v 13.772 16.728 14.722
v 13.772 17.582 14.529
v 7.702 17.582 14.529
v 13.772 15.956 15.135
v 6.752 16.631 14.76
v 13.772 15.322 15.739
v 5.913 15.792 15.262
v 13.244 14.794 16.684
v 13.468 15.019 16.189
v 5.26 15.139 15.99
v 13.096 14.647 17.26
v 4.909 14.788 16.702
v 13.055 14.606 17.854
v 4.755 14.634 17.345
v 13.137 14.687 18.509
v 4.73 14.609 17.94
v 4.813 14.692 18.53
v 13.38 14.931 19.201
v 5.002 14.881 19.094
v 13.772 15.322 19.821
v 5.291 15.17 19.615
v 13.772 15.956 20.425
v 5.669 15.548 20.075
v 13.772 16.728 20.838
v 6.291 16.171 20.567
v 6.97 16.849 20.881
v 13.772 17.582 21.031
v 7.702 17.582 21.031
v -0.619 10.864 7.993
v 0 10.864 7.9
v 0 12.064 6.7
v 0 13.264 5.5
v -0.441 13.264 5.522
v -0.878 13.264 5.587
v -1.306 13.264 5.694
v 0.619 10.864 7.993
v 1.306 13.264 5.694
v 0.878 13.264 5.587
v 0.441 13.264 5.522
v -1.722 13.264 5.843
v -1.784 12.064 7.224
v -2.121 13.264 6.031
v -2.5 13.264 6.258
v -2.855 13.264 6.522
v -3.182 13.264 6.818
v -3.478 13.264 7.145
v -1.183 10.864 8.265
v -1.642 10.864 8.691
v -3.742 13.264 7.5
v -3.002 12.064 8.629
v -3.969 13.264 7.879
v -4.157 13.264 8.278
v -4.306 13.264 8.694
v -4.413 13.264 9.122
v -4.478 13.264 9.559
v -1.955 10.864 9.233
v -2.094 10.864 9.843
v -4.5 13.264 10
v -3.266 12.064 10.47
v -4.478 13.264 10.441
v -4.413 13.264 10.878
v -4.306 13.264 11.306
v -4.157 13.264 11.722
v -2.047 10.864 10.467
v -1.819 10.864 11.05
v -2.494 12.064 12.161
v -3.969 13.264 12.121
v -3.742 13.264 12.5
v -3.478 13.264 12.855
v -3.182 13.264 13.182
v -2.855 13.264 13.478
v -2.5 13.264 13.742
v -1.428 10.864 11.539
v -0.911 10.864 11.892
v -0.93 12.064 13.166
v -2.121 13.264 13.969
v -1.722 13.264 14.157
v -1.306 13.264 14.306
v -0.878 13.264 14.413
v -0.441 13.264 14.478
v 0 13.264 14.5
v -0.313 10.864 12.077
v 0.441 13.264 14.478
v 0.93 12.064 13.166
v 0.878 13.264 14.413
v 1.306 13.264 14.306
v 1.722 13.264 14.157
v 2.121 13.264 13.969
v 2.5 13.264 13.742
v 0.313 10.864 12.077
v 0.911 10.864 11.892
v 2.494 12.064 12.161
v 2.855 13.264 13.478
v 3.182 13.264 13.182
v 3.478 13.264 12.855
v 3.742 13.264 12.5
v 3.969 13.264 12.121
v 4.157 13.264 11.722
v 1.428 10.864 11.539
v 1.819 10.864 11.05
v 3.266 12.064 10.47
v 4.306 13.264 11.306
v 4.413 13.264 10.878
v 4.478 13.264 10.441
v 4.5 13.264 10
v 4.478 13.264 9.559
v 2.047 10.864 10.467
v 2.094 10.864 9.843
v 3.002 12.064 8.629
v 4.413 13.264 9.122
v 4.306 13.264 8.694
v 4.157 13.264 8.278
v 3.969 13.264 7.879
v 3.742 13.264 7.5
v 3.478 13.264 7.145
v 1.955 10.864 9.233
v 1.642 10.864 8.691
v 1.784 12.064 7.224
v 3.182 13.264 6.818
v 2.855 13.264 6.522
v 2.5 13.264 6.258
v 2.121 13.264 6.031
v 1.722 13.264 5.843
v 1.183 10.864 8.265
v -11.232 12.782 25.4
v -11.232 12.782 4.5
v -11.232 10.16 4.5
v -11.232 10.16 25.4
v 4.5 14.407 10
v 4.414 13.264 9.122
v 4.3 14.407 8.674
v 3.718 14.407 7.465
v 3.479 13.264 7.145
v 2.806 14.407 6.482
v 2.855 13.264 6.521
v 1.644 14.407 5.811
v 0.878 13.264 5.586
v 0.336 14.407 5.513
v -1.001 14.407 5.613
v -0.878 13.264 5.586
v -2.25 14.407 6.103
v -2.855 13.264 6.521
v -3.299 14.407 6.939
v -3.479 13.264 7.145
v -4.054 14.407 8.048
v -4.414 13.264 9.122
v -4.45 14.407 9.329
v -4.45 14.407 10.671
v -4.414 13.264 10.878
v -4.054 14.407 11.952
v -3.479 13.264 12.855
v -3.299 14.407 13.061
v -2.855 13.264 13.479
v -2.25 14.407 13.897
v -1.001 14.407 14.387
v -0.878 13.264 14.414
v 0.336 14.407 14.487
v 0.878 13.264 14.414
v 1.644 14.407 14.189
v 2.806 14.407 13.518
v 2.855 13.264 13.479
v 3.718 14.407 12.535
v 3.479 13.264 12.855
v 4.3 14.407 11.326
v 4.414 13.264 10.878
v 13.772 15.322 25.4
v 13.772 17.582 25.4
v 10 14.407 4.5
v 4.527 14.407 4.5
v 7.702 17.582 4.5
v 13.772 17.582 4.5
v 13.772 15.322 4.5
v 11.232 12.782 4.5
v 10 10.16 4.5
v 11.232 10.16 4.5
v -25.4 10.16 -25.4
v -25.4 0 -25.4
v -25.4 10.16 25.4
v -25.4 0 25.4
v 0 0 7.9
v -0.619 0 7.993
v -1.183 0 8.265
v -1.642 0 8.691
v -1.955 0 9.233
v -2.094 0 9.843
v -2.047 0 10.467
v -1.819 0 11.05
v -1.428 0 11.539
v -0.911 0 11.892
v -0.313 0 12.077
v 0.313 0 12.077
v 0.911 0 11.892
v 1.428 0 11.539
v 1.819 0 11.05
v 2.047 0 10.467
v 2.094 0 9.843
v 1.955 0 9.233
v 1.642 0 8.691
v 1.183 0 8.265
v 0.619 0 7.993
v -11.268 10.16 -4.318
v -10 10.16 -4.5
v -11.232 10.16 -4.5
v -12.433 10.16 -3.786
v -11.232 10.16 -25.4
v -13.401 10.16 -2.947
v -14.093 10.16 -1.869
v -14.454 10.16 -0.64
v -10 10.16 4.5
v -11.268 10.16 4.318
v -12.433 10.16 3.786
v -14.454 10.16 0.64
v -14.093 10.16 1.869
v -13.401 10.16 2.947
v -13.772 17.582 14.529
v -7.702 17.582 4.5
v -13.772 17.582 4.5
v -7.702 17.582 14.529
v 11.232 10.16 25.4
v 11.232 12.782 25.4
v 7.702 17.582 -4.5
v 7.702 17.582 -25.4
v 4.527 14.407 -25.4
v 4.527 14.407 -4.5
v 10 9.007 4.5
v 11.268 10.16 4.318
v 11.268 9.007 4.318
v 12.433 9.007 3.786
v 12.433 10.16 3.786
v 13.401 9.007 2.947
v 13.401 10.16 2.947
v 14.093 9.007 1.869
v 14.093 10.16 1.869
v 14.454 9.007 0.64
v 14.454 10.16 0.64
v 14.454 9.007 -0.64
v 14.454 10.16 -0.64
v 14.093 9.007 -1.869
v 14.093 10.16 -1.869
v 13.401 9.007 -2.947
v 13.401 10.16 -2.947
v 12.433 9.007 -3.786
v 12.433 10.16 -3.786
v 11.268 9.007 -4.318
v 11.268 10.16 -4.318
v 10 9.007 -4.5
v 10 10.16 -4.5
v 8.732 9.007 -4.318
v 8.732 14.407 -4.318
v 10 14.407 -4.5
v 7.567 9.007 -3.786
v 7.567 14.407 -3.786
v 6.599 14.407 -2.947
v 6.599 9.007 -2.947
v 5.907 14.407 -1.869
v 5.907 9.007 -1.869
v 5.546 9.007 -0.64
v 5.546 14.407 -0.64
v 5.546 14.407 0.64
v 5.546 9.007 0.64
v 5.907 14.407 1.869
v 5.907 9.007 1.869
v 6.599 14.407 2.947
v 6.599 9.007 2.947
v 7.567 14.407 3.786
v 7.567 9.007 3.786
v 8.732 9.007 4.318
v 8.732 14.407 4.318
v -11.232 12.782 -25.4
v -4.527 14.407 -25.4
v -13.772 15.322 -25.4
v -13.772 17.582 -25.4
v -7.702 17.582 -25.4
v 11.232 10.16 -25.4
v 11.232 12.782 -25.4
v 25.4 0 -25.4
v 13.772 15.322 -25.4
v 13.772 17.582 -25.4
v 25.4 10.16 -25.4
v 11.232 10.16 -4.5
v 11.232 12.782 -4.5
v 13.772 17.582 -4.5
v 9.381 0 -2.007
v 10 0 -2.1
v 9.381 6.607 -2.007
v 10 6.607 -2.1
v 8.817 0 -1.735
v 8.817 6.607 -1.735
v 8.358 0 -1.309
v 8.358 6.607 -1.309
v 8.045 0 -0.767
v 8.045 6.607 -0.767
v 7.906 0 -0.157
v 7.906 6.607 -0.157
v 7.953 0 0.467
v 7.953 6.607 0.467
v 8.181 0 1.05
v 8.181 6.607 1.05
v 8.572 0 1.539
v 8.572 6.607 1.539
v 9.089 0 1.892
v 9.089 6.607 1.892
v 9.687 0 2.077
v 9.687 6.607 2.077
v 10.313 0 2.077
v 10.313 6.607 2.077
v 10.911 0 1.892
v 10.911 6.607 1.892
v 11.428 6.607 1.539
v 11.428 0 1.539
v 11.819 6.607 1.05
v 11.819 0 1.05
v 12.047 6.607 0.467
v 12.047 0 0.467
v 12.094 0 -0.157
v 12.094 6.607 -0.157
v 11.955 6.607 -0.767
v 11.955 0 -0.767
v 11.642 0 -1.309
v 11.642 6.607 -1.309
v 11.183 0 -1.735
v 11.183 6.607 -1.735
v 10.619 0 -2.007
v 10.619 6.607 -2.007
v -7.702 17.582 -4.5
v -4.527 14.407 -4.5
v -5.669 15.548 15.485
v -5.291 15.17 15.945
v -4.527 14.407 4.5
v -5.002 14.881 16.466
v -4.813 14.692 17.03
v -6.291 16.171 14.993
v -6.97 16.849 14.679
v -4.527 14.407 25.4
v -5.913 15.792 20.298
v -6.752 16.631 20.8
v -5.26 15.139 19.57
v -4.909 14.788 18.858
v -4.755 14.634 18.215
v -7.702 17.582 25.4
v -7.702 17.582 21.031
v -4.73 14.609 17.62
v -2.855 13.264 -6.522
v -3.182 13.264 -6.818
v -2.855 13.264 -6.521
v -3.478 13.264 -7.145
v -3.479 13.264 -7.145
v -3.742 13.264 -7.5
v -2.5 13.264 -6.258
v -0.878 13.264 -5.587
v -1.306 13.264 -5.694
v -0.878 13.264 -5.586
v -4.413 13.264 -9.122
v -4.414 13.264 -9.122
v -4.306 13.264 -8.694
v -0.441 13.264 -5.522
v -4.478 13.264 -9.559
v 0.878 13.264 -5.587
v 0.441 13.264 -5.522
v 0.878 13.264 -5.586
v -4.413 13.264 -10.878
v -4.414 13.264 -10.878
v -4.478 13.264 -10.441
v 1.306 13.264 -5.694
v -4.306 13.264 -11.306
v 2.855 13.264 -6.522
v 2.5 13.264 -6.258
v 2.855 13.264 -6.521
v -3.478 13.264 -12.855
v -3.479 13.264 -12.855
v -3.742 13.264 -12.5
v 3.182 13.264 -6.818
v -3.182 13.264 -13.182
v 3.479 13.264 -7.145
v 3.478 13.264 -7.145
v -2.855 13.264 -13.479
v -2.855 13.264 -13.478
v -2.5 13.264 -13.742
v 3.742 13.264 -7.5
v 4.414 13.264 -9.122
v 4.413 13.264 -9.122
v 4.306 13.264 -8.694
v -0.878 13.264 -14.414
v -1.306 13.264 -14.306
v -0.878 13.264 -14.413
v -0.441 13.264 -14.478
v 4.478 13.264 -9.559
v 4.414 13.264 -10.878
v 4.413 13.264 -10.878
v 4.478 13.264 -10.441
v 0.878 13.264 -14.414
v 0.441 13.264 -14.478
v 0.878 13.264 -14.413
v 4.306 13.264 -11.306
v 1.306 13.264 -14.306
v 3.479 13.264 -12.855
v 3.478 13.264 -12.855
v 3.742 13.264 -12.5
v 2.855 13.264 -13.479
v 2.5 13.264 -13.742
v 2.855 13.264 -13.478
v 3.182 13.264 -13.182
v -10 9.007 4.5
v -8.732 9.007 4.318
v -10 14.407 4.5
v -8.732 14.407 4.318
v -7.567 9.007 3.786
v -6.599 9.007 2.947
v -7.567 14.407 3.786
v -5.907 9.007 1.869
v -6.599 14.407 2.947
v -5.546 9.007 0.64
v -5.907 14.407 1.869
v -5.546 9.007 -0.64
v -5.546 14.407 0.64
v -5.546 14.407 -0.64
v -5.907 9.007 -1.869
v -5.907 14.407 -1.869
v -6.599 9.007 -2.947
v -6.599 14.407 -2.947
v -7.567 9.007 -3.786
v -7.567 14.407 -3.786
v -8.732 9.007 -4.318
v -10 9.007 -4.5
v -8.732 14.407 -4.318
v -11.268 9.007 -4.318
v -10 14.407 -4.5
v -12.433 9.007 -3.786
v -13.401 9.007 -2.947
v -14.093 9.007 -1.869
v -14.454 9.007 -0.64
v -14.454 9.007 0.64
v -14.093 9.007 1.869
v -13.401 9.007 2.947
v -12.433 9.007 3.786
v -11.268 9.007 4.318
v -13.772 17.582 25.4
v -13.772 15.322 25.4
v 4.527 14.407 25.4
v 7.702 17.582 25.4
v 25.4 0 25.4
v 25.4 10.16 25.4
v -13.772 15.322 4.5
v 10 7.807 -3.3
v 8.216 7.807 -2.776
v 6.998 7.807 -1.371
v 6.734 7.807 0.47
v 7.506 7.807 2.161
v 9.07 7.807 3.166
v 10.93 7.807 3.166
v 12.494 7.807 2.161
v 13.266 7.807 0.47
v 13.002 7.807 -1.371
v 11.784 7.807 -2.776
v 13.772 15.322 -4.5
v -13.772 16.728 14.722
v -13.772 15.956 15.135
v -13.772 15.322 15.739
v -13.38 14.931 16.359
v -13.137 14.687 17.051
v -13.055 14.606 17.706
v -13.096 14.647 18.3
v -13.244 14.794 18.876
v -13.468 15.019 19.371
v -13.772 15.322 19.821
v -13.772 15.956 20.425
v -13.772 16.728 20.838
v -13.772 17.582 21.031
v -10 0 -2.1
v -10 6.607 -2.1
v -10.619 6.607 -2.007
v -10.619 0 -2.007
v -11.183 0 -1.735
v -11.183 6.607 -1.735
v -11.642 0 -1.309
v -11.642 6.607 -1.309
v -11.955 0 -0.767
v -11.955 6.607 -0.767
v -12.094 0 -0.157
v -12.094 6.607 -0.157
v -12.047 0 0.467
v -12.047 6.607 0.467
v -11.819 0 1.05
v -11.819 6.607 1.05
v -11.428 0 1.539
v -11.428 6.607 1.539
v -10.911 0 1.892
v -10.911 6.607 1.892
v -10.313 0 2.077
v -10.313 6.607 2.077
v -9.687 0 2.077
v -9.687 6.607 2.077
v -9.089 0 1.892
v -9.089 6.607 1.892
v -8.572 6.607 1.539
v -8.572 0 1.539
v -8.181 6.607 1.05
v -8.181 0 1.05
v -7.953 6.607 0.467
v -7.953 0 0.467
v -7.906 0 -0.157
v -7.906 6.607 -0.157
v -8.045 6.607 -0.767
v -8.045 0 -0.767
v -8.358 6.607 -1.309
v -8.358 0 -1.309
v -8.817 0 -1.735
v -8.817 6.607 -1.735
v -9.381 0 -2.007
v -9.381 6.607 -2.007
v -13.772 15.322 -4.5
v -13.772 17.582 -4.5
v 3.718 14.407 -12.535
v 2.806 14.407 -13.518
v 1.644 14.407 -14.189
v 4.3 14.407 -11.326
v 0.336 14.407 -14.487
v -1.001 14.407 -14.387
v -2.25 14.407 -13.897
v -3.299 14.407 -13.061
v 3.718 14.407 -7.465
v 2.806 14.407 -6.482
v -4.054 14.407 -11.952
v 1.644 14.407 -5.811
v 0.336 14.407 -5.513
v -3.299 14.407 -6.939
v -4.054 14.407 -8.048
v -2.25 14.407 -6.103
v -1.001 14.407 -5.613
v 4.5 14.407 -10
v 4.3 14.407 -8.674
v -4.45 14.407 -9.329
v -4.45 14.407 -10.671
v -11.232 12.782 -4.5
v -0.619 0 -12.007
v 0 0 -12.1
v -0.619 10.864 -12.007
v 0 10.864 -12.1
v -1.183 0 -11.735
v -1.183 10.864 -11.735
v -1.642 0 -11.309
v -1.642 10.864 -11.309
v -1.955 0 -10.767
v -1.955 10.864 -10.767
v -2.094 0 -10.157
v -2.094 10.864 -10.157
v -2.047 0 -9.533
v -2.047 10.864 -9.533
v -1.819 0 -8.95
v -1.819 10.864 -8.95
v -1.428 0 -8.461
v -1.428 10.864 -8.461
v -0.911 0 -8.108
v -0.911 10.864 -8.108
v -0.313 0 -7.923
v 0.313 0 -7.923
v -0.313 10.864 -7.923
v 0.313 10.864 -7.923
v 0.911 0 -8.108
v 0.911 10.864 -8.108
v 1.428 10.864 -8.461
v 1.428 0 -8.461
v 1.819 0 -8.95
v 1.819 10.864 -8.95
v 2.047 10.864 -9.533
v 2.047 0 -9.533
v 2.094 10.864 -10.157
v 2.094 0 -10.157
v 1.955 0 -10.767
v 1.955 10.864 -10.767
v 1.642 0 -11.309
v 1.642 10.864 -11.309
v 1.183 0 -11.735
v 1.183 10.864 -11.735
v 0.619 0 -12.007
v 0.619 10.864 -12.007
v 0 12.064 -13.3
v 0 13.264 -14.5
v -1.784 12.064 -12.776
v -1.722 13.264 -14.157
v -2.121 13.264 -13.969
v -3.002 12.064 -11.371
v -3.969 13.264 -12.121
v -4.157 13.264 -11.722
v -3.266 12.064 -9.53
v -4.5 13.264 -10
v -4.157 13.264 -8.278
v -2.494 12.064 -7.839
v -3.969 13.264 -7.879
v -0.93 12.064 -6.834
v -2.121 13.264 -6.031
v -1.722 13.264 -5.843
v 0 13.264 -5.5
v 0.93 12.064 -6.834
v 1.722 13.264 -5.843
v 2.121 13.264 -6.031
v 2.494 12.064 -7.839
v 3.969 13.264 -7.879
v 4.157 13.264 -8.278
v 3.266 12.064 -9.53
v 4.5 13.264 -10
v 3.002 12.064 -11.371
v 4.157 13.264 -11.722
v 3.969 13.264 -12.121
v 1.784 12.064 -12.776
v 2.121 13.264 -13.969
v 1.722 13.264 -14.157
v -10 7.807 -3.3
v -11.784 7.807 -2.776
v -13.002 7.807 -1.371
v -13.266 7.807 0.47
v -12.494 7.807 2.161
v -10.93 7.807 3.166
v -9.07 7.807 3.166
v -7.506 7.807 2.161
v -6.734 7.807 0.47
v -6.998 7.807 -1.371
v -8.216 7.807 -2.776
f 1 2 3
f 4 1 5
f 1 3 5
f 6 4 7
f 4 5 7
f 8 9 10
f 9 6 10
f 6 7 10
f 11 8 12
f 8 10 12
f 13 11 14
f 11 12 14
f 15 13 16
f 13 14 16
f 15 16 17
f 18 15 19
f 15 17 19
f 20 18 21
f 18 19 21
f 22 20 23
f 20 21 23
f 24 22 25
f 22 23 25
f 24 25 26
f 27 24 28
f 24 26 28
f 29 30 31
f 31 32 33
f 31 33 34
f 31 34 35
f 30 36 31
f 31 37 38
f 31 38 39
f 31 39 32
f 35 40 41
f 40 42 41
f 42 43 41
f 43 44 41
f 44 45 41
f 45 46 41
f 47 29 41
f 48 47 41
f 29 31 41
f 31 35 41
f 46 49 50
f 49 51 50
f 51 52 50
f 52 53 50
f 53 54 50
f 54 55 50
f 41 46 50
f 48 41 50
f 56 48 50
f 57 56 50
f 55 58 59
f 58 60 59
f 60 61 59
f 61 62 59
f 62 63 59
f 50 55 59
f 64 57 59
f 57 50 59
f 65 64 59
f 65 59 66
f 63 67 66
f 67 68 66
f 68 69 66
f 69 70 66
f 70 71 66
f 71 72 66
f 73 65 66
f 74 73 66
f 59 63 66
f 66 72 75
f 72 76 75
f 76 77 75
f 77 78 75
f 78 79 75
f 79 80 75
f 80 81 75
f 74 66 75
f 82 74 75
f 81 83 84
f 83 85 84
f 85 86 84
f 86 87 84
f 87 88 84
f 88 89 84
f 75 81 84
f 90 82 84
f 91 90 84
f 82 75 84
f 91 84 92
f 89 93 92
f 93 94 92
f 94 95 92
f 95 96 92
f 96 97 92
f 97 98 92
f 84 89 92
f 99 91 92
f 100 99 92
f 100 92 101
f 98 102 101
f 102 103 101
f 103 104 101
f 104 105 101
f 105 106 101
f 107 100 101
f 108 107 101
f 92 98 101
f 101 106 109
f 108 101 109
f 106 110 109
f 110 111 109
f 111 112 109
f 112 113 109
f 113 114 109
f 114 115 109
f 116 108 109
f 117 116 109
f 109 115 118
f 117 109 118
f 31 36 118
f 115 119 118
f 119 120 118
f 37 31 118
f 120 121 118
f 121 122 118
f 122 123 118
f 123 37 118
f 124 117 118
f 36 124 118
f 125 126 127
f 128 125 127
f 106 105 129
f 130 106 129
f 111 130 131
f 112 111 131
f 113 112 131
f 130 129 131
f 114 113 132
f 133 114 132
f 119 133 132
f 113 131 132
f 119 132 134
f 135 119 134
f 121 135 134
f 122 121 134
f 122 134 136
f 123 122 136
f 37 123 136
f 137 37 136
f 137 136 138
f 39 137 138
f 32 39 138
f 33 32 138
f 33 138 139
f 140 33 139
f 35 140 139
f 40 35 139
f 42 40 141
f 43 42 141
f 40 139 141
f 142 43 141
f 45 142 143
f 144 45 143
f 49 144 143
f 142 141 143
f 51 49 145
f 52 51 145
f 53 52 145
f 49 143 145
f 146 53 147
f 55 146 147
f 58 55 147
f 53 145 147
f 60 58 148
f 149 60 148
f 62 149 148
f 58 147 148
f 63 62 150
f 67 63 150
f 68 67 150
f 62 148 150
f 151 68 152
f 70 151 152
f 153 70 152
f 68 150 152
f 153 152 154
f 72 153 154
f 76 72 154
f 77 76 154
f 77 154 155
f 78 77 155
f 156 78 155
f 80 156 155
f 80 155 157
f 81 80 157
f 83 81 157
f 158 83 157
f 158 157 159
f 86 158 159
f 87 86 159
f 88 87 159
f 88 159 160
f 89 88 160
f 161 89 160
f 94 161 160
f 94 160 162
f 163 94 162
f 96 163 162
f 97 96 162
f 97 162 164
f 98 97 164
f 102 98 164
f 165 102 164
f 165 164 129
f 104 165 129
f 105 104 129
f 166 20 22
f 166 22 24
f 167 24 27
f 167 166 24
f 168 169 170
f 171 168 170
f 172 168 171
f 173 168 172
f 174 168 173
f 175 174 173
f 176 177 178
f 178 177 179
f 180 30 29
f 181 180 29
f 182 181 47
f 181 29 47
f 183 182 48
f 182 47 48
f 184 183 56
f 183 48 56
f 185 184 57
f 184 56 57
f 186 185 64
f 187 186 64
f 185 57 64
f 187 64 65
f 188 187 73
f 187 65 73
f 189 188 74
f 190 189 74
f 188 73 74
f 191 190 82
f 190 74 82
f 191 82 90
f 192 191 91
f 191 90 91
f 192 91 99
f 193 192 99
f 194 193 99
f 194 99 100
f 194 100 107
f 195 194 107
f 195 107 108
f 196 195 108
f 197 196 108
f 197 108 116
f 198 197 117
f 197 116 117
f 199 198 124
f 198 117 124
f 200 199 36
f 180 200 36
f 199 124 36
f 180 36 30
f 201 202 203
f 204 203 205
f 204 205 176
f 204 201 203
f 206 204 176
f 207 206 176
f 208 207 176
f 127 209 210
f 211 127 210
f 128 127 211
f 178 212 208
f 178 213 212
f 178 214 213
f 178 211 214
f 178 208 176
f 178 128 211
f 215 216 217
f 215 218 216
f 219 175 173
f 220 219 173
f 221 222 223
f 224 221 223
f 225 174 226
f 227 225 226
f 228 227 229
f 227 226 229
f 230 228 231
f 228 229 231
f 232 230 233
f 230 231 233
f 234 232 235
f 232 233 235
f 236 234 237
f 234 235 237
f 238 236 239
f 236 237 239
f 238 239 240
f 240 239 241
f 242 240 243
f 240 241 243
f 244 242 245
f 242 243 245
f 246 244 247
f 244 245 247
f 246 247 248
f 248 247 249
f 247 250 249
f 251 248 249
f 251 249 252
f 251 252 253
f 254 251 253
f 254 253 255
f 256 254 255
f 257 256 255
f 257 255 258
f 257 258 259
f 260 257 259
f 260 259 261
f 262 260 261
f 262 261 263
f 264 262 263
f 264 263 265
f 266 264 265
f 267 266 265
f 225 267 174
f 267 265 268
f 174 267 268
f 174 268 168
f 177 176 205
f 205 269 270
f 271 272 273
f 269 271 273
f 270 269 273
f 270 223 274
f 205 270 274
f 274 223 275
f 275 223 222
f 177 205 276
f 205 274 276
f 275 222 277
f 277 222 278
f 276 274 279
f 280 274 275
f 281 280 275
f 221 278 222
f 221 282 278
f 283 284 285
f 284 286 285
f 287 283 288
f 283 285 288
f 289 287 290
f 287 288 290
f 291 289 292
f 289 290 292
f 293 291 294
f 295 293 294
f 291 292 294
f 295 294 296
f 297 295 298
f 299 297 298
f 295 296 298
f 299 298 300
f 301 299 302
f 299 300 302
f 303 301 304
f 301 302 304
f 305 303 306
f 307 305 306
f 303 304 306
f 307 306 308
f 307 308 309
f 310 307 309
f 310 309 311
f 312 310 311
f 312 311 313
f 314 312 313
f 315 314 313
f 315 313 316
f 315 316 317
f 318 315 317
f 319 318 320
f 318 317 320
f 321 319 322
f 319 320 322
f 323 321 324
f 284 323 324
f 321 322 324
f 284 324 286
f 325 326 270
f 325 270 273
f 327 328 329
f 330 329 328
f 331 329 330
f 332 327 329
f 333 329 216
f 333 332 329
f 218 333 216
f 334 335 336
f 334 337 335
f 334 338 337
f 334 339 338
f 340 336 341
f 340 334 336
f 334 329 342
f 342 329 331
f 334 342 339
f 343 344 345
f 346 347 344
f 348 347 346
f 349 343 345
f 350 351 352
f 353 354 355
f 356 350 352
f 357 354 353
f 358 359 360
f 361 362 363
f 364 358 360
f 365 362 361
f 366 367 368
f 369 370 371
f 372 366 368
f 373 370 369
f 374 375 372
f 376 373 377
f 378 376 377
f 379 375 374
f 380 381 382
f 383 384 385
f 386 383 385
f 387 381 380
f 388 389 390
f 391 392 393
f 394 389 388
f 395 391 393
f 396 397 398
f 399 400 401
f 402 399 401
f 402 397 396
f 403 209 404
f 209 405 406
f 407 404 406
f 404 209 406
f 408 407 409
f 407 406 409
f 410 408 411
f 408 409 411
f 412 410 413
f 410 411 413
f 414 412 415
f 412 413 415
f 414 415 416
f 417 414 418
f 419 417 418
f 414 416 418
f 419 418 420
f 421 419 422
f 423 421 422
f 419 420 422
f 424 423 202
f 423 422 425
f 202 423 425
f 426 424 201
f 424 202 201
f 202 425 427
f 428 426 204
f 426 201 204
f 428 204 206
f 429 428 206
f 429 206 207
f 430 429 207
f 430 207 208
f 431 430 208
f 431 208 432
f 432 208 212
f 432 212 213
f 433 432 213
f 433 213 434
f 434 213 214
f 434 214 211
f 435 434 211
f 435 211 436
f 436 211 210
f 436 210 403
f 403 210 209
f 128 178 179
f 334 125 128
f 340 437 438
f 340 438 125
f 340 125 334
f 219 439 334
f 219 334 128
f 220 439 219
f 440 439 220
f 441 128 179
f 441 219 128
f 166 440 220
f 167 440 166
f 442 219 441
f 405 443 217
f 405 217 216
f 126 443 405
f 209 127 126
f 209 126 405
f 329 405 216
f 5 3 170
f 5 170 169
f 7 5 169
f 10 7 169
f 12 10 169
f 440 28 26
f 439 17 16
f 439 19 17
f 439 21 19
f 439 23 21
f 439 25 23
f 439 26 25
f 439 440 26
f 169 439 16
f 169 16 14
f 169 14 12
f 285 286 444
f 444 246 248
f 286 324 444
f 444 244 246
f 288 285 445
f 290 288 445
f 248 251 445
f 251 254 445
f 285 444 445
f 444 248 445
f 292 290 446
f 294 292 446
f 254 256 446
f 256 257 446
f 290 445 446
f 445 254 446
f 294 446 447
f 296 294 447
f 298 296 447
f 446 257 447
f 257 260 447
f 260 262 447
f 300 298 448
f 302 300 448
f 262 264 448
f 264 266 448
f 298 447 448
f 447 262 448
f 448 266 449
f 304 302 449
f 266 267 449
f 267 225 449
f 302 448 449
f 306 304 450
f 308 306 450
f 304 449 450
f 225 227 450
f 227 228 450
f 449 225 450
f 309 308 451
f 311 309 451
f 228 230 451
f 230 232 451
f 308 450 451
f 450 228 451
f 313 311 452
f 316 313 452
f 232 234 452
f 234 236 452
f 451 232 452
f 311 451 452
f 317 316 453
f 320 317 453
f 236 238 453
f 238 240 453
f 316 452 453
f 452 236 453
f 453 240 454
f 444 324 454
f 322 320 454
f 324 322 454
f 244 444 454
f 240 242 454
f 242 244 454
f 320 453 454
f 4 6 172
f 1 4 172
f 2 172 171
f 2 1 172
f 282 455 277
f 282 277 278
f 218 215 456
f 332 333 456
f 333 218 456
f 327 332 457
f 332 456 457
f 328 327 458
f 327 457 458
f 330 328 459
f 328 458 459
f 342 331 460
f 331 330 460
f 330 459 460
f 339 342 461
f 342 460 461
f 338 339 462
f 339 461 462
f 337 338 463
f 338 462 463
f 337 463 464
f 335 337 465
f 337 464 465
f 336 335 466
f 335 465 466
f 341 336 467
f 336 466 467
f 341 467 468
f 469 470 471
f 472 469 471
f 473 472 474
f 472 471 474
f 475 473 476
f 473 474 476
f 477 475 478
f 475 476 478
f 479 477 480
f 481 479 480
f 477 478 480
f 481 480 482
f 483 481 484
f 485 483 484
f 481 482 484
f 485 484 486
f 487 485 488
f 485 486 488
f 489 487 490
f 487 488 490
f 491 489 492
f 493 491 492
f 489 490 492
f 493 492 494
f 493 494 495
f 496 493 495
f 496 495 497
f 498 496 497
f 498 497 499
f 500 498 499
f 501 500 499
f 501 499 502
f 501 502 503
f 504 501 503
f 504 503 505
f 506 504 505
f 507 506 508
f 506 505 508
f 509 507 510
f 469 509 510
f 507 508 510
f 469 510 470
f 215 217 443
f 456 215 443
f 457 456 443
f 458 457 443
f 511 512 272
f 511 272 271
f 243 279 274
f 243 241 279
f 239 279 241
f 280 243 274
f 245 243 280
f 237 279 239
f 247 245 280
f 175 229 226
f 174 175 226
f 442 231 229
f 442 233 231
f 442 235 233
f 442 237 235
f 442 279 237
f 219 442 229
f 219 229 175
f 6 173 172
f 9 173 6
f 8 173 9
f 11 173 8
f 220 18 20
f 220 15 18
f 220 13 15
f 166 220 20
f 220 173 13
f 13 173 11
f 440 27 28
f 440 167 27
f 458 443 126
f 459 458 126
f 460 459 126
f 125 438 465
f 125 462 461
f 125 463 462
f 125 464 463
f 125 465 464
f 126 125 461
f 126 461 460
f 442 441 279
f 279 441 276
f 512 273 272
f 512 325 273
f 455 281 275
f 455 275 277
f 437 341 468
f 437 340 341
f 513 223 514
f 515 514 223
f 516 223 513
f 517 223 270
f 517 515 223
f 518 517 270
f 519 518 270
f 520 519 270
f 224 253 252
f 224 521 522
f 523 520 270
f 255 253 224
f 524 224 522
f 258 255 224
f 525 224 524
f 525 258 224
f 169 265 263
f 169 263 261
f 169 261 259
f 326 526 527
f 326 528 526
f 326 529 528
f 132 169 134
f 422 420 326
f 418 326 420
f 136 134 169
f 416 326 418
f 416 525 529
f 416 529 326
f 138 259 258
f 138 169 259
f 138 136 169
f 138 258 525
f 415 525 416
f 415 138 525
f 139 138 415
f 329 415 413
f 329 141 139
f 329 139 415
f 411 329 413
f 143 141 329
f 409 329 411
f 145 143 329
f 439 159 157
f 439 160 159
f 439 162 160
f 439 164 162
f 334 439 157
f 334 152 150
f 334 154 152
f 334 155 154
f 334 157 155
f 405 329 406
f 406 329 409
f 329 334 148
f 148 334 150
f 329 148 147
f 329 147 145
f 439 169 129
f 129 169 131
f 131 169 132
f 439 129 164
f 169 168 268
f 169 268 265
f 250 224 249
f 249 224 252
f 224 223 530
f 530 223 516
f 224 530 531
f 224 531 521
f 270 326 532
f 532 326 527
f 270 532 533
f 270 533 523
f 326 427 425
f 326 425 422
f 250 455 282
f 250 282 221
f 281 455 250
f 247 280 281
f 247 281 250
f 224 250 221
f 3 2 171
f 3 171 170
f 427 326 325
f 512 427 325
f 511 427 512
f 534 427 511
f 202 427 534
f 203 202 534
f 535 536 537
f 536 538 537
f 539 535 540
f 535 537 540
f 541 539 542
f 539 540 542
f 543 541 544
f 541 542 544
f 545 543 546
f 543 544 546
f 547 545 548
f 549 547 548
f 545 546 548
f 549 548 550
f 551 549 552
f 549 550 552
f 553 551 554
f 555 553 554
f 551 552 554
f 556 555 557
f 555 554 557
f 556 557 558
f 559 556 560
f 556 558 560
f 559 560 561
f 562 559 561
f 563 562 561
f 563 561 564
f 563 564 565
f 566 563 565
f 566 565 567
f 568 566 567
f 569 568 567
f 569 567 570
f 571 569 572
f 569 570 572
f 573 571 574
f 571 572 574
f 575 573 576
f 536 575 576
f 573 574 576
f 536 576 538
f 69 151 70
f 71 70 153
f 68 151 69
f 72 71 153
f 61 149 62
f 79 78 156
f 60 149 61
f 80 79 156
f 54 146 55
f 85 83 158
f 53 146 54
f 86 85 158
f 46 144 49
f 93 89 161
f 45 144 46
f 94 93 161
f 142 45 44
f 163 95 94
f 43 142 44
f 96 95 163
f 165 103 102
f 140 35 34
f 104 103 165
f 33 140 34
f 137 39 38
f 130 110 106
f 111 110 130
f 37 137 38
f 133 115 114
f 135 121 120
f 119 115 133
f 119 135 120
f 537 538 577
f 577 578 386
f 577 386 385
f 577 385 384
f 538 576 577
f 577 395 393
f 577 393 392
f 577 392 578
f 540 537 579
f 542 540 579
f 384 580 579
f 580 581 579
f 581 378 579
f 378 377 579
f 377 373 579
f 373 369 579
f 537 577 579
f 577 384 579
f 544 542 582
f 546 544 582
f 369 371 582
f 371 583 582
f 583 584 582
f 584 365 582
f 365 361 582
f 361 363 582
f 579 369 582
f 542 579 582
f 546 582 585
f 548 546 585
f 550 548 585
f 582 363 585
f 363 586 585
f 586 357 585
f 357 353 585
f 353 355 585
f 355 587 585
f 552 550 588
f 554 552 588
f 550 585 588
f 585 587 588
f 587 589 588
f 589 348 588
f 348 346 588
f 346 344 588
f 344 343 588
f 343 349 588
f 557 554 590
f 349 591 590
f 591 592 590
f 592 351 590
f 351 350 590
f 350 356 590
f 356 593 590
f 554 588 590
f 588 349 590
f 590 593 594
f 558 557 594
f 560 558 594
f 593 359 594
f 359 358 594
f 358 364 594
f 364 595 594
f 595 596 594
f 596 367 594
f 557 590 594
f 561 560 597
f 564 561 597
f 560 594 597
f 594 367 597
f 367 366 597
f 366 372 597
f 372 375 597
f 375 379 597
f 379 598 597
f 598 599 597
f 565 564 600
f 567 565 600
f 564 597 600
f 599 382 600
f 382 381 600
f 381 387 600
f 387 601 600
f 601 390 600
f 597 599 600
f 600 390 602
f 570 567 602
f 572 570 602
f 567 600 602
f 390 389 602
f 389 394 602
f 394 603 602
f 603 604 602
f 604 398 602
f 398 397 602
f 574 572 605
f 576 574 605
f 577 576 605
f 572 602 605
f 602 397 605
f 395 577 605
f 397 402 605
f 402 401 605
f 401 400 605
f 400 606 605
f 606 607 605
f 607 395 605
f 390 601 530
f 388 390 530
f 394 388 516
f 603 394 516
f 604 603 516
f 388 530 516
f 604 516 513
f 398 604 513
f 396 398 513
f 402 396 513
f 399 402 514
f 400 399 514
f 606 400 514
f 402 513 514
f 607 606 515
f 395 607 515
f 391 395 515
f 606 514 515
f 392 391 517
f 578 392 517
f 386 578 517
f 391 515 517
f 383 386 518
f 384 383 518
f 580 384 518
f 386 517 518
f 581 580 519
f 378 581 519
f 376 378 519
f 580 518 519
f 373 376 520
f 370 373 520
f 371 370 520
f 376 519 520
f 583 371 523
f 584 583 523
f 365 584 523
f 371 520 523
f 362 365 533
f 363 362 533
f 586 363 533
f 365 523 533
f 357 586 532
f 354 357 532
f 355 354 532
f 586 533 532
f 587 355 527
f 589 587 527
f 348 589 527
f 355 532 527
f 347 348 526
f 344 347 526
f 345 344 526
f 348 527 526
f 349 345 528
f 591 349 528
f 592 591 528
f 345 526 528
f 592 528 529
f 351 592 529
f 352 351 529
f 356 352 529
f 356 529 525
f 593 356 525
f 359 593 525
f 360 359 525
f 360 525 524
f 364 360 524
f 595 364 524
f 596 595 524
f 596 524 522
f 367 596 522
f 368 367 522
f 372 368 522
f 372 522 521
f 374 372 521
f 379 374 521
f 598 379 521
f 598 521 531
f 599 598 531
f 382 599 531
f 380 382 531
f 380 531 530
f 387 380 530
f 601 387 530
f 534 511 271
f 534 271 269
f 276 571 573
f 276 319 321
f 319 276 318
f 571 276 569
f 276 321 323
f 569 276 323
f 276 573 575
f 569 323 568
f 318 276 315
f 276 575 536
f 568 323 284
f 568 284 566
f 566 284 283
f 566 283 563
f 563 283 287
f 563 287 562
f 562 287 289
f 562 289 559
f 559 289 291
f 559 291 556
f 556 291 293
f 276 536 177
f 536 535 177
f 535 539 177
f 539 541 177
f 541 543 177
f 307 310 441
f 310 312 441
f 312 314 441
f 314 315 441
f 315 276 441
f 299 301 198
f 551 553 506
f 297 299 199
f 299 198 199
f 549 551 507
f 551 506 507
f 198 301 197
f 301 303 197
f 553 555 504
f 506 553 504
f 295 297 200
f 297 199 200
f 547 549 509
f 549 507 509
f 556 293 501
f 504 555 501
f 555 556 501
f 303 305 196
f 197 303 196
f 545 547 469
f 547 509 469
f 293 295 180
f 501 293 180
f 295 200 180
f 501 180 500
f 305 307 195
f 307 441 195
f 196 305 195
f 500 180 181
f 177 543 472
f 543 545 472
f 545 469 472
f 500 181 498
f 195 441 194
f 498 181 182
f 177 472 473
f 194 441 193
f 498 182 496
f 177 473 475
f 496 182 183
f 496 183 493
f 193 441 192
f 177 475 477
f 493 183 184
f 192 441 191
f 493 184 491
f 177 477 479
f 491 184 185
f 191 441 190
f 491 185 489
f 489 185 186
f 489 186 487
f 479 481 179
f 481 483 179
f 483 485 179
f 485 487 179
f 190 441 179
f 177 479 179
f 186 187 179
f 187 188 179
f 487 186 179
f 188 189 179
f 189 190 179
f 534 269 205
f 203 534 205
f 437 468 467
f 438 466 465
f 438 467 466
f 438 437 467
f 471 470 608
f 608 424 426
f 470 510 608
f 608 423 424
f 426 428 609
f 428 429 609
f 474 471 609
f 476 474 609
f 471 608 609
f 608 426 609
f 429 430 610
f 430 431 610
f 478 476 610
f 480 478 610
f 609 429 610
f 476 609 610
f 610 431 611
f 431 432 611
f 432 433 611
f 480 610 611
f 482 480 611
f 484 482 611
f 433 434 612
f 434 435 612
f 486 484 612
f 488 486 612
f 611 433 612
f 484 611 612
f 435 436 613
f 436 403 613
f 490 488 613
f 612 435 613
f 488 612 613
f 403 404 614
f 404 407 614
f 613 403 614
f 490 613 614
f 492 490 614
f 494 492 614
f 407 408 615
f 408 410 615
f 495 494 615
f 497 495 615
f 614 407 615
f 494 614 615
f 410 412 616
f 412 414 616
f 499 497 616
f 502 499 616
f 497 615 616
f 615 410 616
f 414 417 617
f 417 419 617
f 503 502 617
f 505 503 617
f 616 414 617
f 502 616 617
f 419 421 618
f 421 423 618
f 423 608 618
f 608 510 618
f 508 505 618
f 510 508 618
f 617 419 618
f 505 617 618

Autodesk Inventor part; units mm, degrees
ref_plane "YZ Plane" through (0, 0, 0) normal (1, 0, 0) x (0, 1, 0)
ref_plane "XZ Plane" through (0, 0, 0) normal (0, 1, 0) x (-1, 0, 0)
ref_plane "XY Plane" through (0, 0, 0) normal (0, 0, 1) x (1, 0, 0)
sketch "Sketch1" plane through (0, 0, 0) normal (0, 1, 0) x (-1, 0, 0)
  line L0 (25.4, 25.4) -> (-25.4, 25.4)
  line L1 (-25.4, 25.4) -> (-25.4, -25.4)
  line L2 (-25.4, -25.4) -> (25.4, -25.4)
  line L3 (25.4, -25.4) -> (25.4, 25.4)
  line L4 (25.4, 25.4) -> (-25.4, -25.4) construction
  line L5 (-25.4, 25.4) -> (25.4, -25.4) construction
  point P0 (0, 0)
  dimension "d0" = 50.8
  dimension "d1" = 50.8
extrude "Extrusion1" add sketch "Sketch1" along normal blind 10.16
sketch "Sketch2" plane through (-25.4, 0, 25.4) normal (0, 0, 1) x (1, 0, 0)
  line L0 (0, 10.16) -> (50.8, 10.16) projected
  line L1 (36.83, 10.16) -> (36.83, 12.7) construction
  line L2 (36.83, 12.7) -> (39.37, 15.24) construction
  line L3 (39.37, 15.24) -> (39.37, 17.78) construction
  line L4 (39.37, 17.78) -> (33.02, 17.78) construction
  line L5 (33.02, 17.78) -> (29.845, 14.605) construction
  line L6 (29.845, 14.605) -> (25.4, 14.605) construction
  line L7 (25.4, 14.605) -> (25.4, 10.16) construction
  line L8 (25.4, 10.16) -> (36.83, 10.16) construction
  line L9 (36.6316, 10.16) -> (36.6316, 12.7822)
  line L10 (36.6316, 12.7822) -> (39.1716, 15.3222)
  line L11 (39.1716, 15.3222) -> (39.1716, 17.5816)
  line L12 (39.1716, 17.5816) -> (33.1022, 17.5816)
  line L13 (33.1022, 17.5816) -> (29.9272, 14.4066)
  line L14 (29.9272, 14.4066) -> (25.4, 14.4066)
  line L15 (25.4, 10.16) -> (25.4, 14.4066)
  line L16 (25.4, 10.16) -> (36.6316, 10.16)
  point P0 (25.4, 0)
  dimension "d4" = 2.54
  dimension "d5" = 2.54
  dimension "d6" = 135
  dimension "d7" = 3.175
  dimension "d8" = 6.35
  dimension "d9" = 13.97
  dimension "d10" = 11.43
  dimension "d26" = 0.1984
  dimension "d27" = 0.1984
  dimension "d28" = 0.1984
  dimension "d29" = 0.1984
  dimension "d30" = 0.1984
  dimension "d31" = 0.1984
extrude "Extrusion2" add sketch "Sketch2" against normal up to surface (50.8 mm away)
mirror "Mirror1" about plane through (0, 10.16, 25.4) normal (-1, 0, 0) of "Extrusion2"
sketch "Sketch3" plane through (0, 0, 0) normal (0, -1, 0) x (1, 0, 0)
  line L0 (0, -10) -> (10, 0) construction
  line L1 (10, 0) -> (0, 10) construction
  line L2 (0, 10) -> (-10, 0) construction
  line L3 (-10, 0) -> (0, -10) construction
  line L4 (0, -10) -> (0, 10) construction
  line L5 (10, 0) -> (-10, 0) construction
  point P0 (0, 0)
  point P1 (-10, 0)
  dimension "d13" = 20
hole "Hole1" at (0, 0, 10) at (-10, 0, 0) at (0, 0, -10) at (10, 0, 0) direction (0, 1, 0) diameter 4.2 end through all
sketch "Sketch4" plane through (4.3628, 14.4066, 25.4) normal (0, 1, 0) x (1, 0, 0)
  arc A0 (5.6372, 29.9) -> (5.6372, 20.9) centre (5.6372, 25.4) ccw
  circle A1 centre (-4.3628, 15.4) radius 4.5
  arc A2 (-14.3628, 29.9) -> (-14.3628, 20.9) centre (-14.3628, 25.4) ccw
  circle A3 centre (-4.3628, 35.4) radius 4.5
  line L0 (-14.3628, 20.9) -> (-18.1344, 20.9)
  line L1 (-18.1344, 20.9) -> (-18.1344, 29.9)
  line L2 (-18.1344, 29.9) -> (-14.3628, 29.9)
  line L3 (5.6372, 20.9) -> (9.4088, 20.9)
  line L4 (9.4088, 20.9) -> (9.4088, 29.9)
  line L5 (9.4088, 29.9) -> (5.6372, 29.9)
  arc A4 (5.6372, 20.9) -> (5.6372, 29.9) centre (5.6372, 25.4) ccw
  arc A5 (-14.3628, 20.9) -> (-14.3628, 29.9) centre (-14.3628, 25.4) ccw
  line L6 (9.4088, 0) -> (9.4088, 50.8) projected
  line L7 (-18.1344, 0) -> (-18.1344, 50.8) projected
  circle A6 centre (-4.3628, 15.4) radius 2.1 construction
  circle A7 centre (5.6372, 25.4) radius 2.1 construction
  circle A8 centre (-4.3628, 35.4) radius 2.1 construction
  circle A9 centre (-14.3628, 25.4) radius 2.1 construction
  line L8 (5.6372, 20.9) -> (-14.3628, 20.9)
  line L9 (-14.3628, 29.9) -> (5.6372, 29.9)
  dimension "d21" = 9
extrude "Extrusion3" cut sketch "Sketch4" along normal blind 10.16 contours A4 L4 A0 | L5 L4 A4 | A0 L8 A5 L9 | A4 L4 L3 | A5 A2 L1 | A2 L1 L2 | L0 L1 A2 | A1 | A3
extrude "Extrusion4" cut sketch "Sketch4" against normal blind 5.4 contours A4 L4 A0 | A4 L4 | A5 A2 L1 | L1 A2
extrude "Extrusion5" cut sketch "Sketch4" against normal up to surface (4.2466 mm away) contours A4 L4 A0 | L5 L4 A4 | A4 L4 L3 | A5 A2 L1 | A2 L1 L2 | L0 L1 A2
chamfer "Chamfer1" distance 2.4 angle 45 2 edges at (10, 9.0066, 2.1) (-10, 9.0066, 2.1)
extrude "Extrusion6" cut sketch "Sketch4" against normal blind 1.143 contours A1 | A3
chamfer "Chamfer2" distance 2.4 angle 45 2 edges at (0, 13.2636, 12.1) (0, 13.2636, -7.9)
sketch "Sketch5" plane through (-13.7716, 15.3222, 25.4) normal (-1, 0, 0) x (0, 0, 1)
  circle A0 centre (-7.62, 2.5446) radius 3.2639 construction
  line L0 (-10.8839, 2.5446) -> (-10.8839, 2.2594) construction
  line L1 (-10.8839, 2.2594) -> (-4.3686, 2.2594) construction
  line L2 (-10.8839, 2.2594) -> (-10.8839, 2.5446) construction
  line L3 (0, 2.2594) -> (-20.9, 2.2594) construction
  line L4 (0, 2.2594) -> (-20.9, 2.2594) construction
  line L5 (0, 2.2594) -> (-20.9, 2.2594) construction
  arc A1 (-10.8839, 2.5446) -> (-10.8714, 2.2594) centre (-7.62, 2.5446) ccw construction
  arc A2 (-4.3686, 2.2594) -> (-10.8839, 2.5446) centre (-7.62, 2.5446) ccw construction
  line L6 (-4.3686, 2.2594) -> (-10.8714, 2.2594) construction
  line L7 (-10.8714, 2.2594) -> (-10.8839, 2.2594) construction
  circle A3 centre (-7.62, 2.5467) radius 3.2639 projected
  point P0 (-25.4, -15.3222)
  dimension "d44" = 7.62
  dimension "d45" = 6.5278
extrude "Extrusion7" cut sketch "Sketch5" against normal through all
equation "\"d27\" = d26"
equation "\"d28\" = d26"
equation "\"d29\" = d26"
equation "\"d30\" = d26"
equation "\"d31\" = d26"
properties part number "Gantry_Mount_Rail" material "ABS Plastic"
